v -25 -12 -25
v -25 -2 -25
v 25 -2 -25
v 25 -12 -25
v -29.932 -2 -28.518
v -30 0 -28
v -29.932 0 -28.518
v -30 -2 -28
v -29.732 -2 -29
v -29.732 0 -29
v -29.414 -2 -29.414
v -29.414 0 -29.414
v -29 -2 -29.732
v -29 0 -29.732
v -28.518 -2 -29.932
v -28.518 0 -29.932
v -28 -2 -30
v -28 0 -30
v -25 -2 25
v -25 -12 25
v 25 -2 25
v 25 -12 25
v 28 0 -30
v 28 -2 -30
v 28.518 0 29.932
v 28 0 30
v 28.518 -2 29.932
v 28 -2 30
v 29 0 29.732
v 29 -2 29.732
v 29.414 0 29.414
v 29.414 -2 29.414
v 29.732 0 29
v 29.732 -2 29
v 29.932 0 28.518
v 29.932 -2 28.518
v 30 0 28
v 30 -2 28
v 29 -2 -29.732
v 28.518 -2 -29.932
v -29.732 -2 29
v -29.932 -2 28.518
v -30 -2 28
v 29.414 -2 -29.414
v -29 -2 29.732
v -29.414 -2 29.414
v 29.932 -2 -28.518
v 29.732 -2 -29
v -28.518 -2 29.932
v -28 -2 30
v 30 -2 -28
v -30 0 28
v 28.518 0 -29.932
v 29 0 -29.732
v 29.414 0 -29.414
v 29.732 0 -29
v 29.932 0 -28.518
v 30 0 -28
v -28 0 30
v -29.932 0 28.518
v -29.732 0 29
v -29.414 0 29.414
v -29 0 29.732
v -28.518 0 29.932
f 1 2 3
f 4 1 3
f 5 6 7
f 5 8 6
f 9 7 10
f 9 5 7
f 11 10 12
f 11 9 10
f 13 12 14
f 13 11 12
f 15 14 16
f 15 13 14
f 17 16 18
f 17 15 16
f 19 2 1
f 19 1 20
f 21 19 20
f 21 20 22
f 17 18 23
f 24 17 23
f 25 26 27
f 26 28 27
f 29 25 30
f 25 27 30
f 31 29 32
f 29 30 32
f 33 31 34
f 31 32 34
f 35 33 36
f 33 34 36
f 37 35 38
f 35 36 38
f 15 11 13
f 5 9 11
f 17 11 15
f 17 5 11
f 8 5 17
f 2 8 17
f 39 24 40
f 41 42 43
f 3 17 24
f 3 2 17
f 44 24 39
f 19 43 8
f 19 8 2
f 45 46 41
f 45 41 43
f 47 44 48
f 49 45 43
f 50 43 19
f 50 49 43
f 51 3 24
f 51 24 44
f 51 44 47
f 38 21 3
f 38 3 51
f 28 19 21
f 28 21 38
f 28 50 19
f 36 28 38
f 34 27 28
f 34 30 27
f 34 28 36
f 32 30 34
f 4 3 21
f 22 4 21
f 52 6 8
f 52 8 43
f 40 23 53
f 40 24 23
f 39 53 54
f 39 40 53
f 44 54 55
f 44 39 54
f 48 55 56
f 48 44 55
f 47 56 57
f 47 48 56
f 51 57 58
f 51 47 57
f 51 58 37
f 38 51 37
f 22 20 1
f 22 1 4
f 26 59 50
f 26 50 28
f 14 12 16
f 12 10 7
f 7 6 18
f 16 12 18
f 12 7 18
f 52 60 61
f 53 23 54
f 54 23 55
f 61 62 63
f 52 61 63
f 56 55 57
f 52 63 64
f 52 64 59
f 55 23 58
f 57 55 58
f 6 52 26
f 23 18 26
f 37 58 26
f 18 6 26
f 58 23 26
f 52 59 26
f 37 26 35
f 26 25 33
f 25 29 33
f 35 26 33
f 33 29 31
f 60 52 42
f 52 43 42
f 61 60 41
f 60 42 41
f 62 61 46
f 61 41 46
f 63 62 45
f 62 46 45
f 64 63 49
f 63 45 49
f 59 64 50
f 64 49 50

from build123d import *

# Parameters (mm, degrees)
F0_W     = 60
F0_H     = 60
F1_DEPTH = 2
F2_W     = 50
F2_H     = 50
F3_DEPTH = 10
F4_R     = 2


with BuildPart() as f1:
    # F0 (on Front) → F1 (new body)
    with BuildSketch(Plane.XZ):
        Rectangle(F0_W, F0_H)
    extrude(amount=F1_DEPTH)

    # F2 (on face) → F3 (join)
    with BuildSketch(Plane.XZ.offset(2)):
        Rectangle(F2_W, F2_H)
    extrude(amount=F3_DEPTH)

    # F4
    f4_edges = [f1.edges().sort_by_distance(p)[0] for p in [
        (30, -1, -30),
        (30, -1, 30),
        (-30, -1, 30),
        (-30, -1, -30),
    ]]
    fillet(f4_edges, radius=F4_R)


solid = f1.part
